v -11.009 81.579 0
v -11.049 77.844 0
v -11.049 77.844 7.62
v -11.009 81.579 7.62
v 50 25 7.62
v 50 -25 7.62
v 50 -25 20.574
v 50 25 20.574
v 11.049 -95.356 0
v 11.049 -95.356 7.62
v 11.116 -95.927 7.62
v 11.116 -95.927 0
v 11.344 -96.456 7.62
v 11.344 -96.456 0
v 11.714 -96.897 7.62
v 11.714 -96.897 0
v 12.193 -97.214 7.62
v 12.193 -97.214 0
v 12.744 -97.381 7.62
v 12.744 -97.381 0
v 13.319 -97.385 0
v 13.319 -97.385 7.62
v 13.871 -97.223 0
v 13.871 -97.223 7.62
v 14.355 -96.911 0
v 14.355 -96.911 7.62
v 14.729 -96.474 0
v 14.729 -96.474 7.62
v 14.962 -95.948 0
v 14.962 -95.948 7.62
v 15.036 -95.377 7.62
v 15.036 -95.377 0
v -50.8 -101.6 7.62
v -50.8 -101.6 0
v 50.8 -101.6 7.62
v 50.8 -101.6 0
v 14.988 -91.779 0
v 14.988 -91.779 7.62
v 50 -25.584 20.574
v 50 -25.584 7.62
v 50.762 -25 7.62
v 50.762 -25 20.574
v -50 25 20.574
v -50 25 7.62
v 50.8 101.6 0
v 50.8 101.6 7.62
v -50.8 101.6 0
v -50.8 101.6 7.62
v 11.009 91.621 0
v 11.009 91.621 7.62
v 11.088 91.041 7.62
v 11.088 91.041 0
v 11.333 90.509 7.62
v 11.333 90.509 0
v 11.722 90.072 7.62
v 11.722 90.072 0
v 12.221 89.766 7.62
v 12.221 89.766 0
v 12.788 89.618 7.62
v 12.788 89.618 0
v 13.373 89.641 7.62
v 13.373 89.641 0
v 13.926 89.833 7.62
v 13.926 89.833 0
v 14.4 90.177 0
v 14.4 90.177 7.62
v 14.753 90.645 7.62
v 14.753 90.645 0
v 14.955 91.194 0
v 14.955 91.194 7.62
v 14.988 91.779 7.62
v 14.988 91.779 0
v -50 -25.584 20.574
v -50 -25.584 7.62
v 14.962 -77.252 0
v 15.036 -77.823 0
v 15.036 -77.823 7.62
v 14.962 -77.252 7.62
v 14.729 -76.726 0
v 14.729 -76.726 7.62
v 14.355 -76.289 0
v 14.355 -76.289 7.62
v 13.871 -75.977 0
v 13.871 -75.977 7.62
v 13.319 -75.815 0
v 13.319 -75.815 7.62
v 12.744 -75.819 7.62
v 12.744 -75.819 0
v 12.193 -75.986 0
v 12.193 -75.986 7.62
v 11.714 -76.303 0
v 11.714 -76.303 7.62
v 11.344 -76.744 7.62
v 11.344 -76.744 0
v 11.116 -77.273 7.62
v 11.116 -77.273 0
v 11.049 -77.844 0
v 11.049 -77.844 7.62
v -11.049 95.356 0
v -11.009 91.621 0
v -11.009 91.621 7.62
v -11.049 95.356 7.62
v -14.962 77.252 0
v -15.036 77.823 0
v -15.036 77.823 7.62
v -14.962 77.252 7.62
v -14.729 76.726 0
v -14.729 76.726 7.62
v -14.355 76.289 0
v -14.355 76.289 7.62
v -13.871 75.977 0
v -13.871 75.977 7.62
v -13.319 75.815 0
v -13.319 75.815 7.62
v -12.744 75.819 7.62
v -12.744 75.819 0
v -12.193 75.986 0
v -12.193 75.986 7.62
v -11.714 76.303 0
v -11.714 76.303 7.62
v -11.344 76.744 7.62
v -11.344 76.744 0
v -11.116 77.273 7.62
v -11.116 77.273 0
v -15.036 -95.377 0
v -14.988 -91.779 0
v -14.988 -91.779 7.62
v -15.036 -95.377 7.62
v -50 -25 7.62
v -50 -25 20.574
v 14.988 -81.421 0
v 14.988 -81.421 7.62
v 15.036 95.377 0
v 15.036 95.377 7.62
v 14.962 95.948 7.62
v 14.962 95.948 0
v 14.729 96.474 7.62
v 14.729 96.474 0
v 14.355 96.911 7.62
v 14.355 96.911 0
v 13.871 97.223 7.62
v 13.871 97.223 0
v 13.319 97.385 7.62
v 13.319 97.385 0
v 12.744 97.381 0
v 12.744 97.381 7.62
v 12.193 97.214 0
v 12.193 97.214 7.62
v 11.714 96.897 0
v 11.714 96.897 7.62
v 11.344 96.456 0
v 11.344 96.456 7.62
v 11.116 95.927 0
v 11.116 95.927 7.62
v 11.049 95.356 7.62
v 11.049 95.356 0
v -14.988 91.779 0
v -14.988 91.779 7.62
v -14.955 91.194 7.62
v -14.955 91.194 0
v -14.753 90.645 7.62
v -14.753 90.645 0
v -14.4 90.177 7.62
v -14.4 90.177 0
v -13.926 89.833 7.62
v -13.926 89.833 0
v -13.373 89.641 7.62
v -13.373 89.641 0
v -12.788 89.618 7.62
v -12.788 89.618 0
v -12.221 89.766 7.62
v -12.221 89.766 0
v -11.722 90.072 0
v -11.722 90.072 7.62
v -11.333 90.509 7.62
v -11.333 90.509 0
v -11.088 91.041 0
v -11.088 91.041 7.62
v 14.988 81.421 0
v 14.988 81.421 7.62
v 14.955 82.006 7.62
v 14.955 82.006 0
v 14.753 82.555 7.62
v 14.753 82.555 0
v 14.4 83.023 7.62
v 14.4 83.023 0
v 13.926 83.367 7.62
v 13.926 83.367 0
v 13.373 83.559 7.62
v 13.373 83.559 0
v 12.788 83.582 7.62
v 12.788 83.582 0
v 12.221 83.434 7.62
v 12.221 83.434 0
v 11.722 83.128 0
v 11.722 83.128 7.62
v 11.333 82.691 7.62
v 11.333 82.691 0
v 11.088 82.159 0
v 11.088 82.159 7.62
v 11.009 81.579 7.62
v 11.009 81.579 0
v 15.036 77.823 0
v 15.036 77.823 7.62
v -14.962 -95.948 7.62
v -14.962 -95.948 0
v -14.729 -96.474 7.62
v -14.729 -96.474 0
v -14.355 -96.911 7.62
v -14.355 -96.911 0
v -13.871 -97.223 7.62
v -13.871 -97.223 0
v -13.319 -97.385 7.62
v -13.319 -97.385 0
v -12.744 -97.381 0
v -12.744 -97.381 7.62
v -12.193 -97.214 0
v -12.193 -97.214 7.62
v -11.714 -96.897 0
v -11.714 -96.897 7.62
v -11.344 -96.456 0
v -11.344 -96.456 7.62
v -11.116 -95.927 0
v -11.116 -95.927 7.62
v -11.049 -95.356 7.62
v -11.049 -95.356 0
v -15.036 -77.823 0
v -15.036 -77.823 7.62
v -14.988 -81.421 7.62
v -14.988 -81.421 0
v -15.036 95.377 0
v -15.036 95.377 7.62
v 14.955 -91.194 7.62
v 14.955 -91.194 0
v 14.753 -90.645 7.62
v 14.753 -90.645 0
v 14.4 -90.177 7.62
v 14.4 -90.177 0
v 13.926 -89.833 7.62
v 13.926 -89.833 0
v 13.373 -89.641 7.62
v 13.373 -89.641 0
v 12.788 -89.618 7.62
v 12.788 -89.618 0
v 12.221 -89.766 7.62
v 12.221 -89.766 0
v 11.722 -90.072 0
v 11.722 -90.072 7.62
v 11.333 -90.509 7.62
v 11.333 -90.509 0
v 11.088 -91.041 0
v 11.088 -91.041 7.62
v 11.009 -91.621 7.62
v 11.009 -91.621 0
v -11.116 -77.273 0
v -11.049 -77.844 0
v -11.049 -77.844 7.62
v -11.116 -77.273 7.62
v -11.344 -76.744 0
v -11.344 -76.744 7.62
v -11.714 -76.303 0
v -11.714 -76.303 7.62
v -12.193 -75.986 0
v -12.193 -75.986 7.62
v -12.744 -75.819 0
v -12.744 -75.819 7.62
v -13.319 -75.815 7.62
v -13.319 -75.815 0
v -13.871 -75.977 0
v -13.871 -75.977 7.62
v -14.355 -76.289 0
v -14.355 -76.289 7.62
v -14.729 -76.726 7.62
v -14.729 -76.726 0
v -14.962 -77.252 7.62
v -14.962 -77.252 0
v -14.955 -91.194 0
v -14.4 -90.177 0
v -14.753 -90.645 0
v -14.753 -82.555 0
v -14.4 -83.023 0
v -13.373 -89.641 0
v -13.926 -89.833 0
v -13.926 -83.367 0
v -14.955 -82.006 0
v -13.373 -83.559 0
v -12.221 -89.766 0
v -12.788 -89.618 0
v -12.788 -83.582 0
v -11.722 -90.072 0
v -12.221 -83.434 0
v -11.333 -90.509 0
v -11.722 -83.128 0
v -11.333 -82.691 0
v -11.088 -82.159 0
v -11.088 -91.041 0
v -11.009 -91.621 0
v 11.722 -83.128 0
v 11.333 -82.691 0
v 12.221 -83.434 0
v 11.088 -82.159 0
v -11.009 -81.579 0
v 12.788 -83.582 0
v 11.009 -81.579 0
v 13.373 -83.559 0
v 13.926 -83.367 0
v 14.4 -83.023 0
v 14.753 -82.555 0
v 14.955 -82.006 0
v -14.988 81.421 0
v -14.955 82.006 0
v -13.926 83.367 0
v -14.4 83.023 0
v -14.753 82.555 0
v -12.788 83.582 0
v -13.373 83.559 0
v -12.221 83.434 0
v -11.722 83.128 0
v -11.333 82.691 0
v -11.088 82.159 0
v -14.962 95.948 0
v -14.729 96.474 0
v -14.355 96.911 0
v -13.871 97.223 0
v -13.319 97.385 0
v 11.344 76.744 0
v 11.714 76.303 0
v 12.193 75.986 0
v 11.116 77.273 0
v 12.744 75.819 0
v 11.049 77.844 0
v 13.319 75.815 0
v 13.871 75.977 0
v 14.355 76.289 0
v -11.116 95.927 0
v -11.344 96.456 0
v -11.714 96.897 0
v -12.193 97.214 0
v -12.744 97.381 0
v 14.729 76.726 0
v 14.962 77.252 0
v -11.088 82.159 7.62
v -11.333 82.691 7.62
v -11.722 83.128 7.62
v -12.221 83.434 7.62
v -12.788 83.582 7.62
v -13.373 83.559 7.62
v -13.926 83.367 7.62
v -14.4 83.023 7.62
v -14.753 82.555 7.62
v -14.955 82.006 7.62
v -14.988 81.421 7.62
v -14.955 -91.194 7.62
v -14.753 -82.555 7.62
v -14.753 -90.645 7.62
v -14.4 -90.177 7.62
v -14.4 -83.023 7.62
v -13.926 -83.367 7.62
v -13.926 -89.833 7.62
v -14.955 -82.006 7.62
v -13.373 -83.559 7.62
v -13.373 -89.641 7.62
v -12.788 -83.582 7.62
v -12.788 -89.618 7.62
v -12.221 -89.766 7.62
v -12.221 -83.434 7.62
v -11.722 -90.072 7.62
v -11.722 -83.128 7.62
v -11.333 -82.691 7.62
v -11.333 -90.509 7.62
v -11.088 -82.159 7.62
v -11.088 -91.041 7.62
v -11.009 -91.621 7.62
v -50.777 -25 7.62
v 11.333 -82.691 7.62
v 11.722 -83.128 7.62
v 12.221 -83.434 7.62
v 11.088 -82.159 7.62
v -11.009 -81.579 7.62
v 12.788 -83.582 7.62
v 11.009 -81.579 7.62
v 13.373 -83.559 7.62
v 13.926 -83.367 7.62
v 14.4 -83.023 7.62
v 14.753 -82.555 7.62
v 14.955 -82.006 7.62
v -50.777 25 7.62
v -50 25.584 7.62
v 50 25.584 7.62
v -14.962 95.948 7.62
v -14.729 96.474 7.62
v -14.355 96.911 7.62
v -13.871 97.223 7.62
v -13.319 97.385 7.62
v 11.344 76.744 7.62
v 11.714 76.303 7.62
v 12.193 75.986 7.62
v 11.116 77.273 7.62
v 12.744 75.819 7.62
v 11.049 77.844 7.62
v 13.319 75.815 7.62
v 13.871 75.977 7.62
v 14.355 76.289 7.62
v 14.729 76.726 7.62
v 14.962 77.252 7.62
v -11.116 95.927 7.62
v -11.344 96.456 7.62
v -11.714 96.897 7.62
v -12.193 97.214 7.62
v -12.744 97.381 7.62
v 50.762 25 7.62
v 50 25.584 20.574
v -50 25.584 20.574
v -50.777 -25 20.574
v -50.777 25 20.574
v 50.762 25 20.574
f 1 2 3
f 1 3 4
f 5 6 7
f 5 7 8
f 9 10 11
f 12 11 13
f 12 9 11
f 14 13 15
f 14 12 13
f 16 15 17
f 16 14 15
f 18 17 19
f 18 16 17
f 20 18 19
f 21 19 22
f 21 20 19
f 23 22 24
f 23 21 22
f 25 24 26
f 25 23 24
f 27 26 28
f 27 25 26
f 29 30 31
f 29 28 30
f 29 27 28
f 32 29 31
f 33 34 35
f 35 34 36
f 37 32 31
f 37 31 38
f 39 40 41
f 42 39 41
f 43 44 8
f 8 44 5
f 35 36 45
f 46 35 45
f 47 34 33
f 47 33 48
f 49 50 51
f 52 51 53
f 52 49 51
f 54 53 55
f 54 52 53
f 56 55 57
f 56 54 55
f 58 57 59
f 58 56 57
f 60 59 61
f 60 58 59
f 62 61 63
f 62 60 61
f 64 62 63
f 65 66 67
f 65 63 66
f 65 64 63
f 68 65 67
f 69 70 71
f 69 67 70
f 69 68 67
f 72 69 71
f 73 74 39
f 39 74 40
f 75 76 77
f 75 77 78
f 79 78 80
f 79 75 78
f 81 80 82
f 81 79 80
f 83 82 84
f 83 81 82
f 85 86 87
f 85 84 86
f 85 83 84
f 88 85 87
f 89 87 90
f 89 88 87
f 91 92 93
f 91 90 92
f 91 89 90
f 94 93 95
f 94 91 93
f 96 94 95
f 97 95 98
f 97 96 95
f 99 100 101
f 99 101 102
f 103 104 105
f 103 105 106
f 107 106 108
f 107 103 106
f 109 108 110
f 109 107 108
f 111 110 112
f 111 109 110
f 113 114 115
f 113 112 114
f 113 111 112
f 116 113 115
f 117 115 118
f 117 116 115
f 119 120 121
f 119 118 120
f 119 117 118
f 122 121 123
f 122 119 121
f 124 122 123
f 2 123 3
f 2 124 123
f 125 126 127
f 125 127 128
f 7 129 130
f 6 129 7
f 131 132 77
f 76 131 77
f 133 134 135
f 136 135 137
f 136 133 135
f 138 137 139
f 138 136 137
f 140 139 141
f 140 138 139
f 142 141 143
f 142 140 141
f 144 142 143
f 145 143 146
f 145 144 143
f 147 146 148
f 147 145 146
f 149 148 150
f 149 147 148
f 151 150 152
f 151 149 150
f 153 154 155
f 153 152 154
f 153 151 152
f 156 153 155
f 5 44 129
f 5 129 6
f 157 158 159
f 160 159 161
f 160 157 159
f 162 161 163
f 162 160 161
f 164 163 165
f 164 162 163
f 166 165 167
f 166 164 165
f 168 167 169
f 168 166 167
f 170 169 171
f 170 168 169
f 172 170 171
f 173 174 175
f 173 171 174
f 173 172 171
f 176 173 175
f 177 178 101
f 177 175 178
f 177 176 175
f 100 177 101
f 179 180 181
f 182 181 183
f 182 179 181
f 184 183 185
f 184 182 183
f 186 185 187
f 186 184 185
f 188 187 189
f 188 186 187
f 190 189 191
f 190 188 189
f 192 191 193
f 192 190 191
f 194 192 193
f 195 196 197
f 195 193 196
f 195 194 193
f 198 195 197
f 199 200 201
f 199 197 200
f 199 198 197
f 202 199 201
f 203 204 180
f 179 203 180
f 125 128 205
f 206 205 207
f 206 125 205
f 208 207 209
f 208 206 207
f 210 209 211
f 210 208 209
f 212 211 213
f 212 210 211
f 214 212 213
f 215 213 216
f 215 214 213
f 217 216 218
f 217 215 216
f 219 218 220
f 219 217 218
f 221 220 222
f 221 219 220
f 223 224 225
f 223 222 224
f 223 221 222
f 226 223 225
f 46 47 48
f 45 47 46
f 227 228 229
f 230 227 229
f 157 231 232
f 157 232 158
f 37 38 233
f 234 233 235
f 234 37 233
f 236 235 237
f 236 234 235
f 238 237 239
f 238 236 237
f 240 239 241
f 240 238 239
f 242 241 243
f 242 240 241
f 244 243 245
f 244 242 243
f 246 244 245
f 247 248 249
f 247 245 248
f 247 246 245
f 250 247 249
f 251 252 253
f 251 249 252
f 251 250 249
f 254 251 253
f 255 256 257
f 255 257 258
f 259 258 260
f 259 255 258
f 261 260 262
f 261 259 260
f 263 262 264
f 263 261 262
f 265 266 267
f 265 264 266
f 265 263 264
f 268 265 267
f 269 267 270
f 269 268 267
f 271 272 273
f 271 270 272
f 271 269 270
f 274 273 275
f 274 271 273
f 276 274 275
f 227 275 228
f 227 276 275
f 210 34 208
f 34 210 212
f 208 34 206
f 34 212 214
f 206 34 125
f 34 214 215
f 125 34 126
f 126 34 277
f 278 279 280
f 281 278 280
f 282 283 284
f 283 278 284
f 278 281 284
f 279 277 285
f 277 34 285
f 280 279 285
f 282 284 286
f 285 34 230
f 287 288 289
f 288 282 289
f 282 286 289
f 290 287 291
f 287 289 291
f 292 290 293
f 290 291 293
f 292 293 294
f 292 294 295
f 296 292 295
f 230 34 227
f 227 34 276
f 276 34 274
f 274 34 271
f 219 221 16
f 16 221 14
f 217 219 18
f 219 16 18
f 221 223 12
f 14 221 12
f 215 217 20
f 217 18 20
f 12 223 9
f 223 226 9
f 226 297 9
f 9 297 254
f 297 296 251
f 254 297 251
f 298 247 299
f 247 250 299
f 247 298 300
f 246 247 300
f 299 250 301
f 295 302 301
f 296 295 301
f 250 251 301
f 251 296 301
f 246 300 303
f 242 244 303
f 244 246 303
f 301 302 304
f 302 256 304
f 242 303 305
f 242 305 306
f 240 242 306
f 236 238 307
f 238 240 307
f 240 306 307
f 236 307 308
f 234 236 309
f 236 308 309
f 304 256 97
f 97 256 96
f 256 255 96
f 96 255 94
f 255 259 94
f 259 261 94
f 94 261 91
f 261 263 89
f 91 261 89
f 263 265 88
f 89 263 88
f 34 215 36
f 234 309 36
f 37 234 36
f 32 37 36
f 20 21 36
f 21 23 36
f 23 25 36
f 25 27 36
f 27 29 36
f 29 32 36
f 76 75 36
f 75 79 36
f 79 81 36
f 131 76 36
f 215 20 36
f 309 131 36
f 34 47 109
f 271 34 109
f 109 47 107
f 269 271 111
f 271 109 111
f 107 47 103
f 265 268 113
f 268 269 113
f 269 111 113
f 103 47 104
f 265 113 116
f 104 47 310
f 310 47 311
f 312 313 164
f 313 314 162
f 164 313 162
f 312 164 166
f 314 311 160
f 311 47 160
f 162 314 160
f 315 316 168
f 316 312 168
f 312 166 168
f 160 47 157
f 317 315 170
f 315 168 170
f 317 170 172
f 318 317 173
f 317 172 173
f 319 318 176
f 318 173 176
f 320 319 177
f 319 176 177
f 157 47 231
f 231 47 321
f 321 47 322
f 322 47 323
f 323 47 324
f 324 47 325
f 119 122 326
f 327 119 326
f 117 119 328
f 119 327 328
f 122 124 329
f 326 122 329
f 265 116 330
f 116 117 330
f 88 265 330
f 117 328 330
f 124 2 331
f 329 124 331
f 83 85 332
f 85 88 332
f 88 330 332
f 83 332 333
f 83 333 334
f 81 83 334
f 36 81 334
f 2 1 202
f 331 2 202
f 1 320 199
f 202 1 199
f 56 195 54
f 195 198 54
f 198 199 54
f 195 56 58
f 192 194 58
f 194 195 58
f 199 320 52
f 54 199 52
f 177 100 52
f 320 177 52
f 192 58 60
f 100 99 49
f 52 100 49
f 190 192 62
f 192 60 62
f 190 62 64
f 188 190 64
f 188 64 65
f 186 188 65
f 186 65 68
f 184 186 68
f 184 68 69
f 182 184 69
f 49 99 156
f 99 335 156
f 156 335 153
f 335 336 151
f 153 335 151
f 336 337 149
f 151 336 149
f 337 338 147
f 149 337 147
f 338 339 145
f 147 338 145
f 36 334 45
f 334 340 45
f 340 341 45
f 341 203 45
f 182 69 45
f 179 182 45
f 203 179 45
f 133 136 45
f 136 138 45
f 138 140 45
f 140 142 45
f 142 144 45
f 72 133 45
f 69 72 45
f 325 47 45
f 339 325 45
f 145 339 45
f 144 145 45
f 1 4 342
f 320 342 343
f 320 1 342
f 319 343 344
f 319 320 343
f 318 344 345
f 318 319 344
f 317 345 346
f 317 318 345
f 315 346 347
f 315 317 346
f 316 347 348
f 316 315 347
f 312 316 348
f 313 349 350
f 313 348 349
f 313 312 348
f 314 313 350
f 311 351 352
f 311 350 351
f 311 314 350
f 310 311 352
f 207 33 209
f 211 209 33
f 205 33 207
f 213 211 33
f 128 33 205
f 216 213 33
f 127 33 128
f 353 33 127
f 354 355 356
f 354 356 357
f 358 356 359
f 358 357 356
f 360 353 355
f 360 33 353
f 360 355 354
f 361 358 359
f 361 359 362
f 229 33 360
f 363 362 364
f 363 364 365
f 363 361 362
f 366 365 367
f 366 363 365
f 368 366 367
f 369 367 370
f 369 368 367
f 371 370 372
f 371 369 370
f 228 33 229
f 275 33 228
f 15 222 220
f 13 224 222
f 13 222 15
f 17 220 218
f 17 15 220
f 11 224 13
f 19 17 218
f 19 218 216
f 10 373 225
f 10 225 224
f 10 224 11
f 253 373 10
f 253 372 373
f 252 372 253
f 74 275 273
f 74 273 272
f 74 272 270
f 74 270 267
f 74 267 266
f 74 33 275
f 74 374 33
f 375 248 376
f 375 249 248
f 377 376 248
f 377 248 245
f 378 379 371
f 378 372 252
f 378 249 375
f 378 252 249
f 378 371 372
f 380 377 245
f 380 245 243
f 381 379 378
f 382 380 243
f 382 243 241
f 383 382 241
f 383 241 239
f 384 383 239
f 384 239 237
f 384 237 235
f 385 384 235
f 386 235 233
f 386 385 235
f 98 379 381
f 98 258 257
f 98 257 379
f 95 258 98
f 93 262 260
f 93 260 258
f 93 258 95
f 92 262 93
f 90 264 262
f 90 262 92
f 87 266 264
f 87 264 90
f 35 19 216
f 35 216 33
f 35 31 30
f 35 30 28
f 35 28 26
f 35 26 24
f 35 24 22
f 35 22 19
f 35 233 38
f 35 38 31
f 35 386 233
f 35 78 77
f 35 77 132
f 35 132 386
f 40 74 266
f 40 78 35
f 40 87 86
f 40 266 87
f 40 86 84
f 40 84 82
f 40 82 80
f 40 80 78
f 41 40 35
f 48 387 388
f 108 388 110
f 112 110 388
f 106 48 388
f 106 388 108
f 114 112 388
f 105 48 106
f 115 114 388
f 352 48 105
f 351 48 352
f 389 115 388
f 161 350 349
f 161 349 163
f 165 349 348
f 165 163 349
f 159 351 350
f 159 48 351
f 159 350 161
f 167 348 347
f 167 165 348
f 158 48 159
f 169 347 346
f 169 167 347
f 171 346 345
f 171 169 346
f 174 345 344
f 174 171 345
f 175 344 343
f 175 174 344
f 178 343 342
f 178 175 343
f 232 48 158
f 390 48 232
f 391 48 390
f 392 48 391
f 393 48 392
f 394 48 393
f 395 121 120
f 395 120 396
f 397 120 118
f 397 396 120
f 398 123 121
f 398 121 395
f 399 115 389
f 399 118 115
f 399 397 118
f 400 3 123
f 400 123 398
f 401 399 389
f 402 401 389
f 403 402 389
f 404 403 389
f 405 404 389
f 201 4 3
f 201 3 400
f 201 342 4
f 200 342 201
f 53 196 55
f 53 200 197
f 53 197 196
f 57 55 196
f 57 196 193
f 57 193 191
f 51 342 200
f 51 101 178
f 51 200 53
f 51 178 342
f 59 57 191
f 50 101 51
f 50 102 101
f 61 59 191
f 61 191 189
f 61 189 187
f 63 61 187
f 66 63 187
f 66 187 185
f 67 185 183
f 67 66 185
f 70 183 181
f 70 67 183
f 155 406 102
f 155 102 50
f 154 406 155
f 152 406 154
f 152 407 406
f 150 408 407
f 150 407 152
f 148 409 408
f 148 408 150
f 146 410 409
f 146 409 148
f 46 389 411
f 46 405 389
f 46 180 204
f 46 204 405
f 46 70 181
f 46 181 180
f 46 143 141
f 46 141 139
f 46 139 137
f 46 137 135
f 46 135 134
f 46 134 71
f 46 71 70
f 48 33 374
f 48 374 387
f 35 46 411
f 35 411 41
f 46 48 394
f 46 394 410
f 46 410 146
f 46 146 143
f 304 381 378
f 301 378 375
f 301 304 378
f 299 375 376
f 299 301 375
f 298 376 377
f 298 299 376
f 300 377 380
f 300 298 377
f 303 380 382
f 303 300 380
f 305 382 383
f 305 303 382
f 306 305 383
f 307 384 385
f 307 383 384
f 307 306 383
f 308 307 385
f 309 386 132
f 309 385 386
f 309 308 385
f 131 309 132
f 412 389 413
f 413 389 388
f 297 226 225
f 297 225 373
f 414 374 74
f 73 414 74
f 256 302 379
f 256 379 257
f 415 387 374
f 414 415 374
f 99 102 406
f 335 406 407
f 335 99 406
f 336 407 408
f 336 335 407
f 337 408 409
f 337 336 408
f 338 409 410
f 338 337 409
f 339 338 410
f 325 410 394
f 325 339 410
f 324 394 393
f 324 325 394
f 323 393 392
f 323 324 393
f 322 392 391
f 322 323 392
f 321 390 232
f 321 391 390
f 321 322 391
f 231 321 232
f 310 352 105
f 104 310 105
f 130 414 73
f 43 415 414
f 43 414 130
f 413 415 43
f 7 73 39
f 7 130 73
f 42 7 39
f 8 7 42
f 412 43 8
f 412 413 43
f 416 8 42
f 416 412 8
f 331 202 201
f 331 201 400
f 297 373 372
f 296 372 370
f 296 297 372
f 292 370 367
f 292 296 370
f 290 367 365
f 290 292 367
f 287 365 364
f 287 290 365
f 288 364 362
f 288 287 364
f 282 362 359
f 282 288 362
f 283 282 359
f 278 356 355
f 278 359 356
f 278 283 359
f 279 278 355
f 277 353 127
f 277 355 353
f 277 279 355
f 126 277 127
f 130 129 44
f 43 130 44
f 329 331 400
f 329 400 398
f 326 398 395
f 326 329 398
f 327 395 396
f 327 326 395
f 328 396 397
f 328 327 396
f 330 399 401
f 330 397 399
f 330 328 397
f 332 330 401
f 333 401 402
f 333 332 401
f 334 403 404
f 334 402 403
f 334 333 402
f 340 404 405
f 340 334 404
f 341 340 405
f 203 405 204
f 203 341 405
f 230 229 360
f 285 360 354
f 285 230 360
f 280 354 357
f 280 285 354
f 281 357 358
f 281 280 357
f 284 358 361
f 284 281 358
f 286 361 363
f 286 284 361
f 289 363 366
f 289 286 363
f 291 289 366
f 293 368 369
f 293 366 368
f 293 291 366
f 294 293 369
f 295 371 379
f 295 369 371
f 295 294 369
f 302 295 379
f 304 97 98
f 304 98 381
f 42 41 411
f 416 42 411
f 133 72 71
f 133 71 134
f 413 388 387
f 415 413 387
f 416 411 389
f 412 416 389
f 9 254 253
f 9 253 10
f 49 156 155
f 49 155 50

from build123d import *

# Parameters (mm, degrees)
F0_W     = 101.6
F0_H     = 203.2
F1_DEPTH = 7.62
F3_DEPTH = 25.4
F4_W     = 100
F4_H     = 50
F5_DEPTH = 12.954


with BuildPart() as f1:
    # F0 (on Top) → F1 (new body)
    with BuildSketch(Plane.XY):
        Rectangle(F0_W, F0_H)
    extrude(amount=F1_DEPTH)

    # F2 (on Top) → F3 (cut)
    with BuildSketch(Plane.XY):
        with BuildLine():
            Line((-15.035691, -77.822713), (-14.988321, -81.421245))
            ThreePointArc((-14.988321, -81.421245), (-13.081192, -83.592345), (-11.008666, -81.578528))
            Line((-11.008666, -81.578528), (-11.048887, -77.843856))
            ThreePointArc((-11.048887, -77.843856), (-13.031485, -75.796128), (-15.035691, -77.822713))
        make_face()
        with BuildLine():
            ThreePointArc((-15.035691, -95.377287), (-13.031485, -97.403872), (-11.048887, -95.356144))
            Line((-11.048887, -95.356144), (-11.008666, -91.621472))
            ThreePointArc((-11.008666, -91.621472), (-13.081192, -89.607655), (-14.988321, -91.778755))
            Line((-14.988321, -91.778755), (-15.035691, -95.377287))
        make_face()
        with BuildLine():
            ThreePointArc((15.035691, -77.822713), (13.031485, -75.796128), (11.048887, -77.843856))
            Line((11.048887, -77.843856), (11.008666, -81.578528))
            ThreePointArc((11.008666, -81.578528), (13.081192, -83.592345), (14.988321, -81.421245))
            Line((14.988321, -81.421245), (15.035691, -77.822713))
        make_face()
        with BuildLine():
            Line((11.008666, -91.621472), (11.048887, -95.356144))
            ThreePointArc((11.048887, -95.356144), (13.031485, -97.403872), (15.035691, -95.377287))
            Line((15.035691, -95.377287), (14.988321, -91.778755))
            ThreePointArc((14.988321, -91.778755), (13.081192, -89.607655), (11.008666, -91.621472))
        make_face()
        with BuildLine():
            ThreePointArc((15.035691, 95.377287), (13.031485, 97.403872), (11.048887, 95.356144))
            Line((11.048887, 95.356144), (11.008666, 91.621472))
            ThreePointArc((11.008666, 91.621472), (13.081192, 89.607655), (14.988321, 91.778755))
            Line((14.988321, 91.778755), (15.035691, 95.377287))
        make_face()
        with BuildLine():
            Line((-11.008666, 91.621472), (-11.048887, 95.356144))
            ThreePointArc((-11.048887, 95.356144), (-13.031485, 97.403872), (-15.035691, 95.377287))
            Line((-15.035691, 95.377287), (-14.988321, 91.778755))
            ThreePointArc((-14.988321, 91.778755), (-13.081192, 89.607655), (-11.008666, 91.621472))
        make_face()
        with BuildLine():
            ThreePointArc((-15.035691, 77.822713), (-13.031485, 75.796128), (-11.048887, 77.843856))
            Line((-11.048887, 77.843856), (-11.008666, 81.578528))
            ThreePointArc((-11.008666, 81.578528), (-13.081192, 83.592345), (-14.988321, 81.421245))
            Line((-14.988321, 81.421245), (-15.035691, 77.822713))
        make_face()
        with BuildLine():
            ThreePointArc((11.048887, 77.843856), (13.031485, 75.796128), (15.035691, 77.822713))
            Line((15.035691, 77.822713), (14.988321, 81.421245))
            ThreePointArc((14.988321, 81.421245), (13.081192, 83.592345), (11.008666, 81.578528))
            Line((11.008666, 81.578528), (11.048887, 77.843856))
        make_face()
    extrude(amount=F3_DEPTH, mode=Mode.SUBTRACT)

    # F4 (on face) → F5 (join)
    with BuildSketch(Plane.XY.offset(7.62)):
        Polygon((50, 25.5842), (-50, 25.5842), (-50.777242, 25), (-50.777242, -25), (-50, -25.5842), (50, -25.5842), (50.762001, -25), (50.762001, 25), align=None)
        Rectangle(F4_W, F4_H, mode=Mode.SUBTRACT)
    extrude(amount=F5_DEPTH)


solid = f1.part
